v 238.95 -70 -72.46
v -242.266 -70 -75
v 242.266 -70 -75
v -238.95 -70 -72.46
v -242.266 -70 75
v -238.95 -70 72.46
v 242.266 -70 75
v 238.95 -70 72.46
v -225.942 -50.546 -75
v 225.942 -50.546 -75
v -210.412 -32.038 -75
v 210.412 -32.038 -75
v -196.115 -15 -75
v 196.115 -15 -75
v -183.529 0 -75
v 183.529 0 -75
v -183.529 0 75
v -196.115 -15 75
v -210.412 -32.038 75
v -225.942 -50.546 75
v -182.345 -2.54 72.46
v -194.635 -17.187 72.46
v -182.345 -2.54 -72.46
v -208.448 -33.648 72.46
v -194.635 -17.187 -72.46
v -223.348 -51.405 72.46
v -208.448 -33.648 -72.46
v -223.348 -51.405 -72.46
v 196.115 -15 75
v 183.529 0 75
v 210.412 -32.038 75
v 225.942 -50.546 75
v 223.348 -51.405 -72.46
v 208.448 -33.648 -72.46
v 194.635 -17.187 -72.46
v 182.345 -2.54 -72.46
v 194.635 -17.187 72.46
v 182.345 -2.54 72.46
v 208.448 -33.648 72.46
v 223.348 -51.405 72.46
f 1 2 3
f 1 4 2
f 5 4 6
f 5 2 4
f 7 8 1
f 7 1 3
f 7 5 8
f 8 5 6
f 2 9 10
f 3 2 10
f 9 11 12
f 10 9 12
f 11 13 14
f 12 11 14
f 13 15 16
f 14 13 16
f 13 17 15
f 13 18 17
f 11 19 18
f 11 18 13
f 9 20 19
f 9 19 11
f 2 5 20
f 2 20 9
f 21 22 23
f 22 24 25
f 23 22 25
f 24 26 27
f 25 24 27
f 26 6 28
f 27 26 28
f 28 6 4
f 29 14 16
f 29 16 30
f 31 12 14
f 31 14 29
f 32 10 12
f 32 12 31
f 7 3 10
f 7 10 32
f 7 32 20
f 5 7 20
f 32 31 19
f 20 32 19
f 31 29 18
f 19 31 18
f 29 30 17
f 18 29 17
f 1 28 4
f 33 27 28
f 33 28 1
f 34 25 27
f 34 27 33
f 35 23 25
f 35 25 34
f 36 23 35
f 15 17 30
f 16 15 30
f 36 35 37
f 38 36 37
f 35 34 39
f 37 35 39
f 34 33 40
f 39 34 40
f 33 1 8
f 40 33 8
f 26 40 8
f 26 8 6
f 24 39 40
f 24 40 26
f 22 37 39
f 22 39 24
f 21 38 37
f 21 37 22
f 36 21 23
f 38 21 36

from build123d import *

# Parameters (mm, degrees)
F0_W     = 367.0583882955
F0_H     = 150
F1_DEPTH = 70
F1_TAPER = -40
F3_DEPTH = 180.4313063622
F4_T     = -2.54


with BuildPart() as f1:
    # F0 (on Front) → F1 (new body)
    with BuildSketch(Plane.XZ):
        Rectangle(F0_W, F0_H)
    extrude(amount=F1_DEPTH, taper=F1_TAPER)

    # F2 (on face) → F3 (cut)
    with BuildSketch(Plane(origin=(0, 0, 0), x_dir=(-1, 0, 0), z_dir=(0, 1, 0))):
        Polygon((273.2922434807, -75), (183.5291941477, -75), (-183.5291941477, -75), (-315.6023919582, -75), (-315.6023919582, -152.7352780104), (273.2922434807, -152.7352780104), align=None)
        Polygon((183.5291941477, 75), (257.0646107197, 75), (257.0646107197, 213.5136723518), (-302.473783493, 213.5136723518), (-302.473783493, 75), (-183.5291941477, 75), align=None)
    extrude(amount=-F3_DEPTH, mode=Mode.SUBTRACT)

    # F4
    f4_openings = [f1.faces().sort_by_distance(p)[0] for p in [
        (0, -70, 0),
    ]]
    offset(amount=F4_T, openings=f4_openings, kind=Kind.INTERSECTION)


solid = f1.part
